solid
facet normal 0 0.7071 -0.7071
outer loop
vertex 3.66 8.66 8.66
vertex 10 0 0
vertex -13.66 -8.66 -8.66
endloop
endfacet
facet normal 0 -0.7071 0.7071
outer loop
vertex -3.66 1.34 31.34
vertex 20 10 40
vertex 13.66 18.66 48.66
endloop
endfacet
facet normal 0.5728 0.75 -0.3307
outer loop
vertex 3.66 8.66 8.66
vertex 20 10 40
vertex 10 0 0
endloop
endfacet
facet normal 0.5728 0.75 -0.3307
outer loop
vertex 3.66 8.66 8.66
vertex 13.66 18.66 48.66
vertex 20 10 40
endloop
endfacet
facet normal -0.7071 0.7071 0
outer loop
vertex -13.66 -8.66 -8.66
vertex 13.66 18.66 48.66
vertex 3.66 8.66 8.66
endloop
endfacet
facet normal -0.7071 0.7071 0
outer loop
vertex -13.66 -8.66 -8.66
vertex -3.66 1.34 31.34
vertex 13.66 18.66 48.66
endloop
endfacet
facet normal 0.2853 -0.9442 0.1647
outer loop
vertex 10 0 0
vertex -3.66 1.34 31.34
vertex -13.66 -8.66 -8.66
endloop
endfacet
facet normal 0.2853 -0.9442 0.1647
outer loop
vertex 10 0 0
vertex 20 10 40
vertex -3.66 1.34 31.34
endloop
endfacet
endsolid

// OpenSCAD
// file: deskriptiva3d.scad
module unitTrianglePrism() {
	linear_extrude(u)
	polygon([[u, 0], [-1/2*u, sqrt(3)/2*u], [-1/2*u, -sqrt(3)/2*u]]);
}

module transform3d(T, A, v) {
	// all y coords are switched
    dT = [0, 0, 0];
    dA = [A.x - T.x, - A.y + T.y, A.z - T.z];
	sizedA = sqrt(dA.x * dA.y + dA.x * dA.y + dA.z * dA.z);
    m = [
        [dA.x, 1, 1, u*T.x],
        [dA.y, 1, 1, -u*T.y],
        [dA.z, 1, v, u*T.z],
        [0, 0, 0, 1]
    ];
    
    multmatrix(m) children();
} 
// main file
u = 10;
include<deskriptiva3d.scad>

transform3d([0, 0, 0], [1, 0, 0], 4)
unitTrianglePrism();
